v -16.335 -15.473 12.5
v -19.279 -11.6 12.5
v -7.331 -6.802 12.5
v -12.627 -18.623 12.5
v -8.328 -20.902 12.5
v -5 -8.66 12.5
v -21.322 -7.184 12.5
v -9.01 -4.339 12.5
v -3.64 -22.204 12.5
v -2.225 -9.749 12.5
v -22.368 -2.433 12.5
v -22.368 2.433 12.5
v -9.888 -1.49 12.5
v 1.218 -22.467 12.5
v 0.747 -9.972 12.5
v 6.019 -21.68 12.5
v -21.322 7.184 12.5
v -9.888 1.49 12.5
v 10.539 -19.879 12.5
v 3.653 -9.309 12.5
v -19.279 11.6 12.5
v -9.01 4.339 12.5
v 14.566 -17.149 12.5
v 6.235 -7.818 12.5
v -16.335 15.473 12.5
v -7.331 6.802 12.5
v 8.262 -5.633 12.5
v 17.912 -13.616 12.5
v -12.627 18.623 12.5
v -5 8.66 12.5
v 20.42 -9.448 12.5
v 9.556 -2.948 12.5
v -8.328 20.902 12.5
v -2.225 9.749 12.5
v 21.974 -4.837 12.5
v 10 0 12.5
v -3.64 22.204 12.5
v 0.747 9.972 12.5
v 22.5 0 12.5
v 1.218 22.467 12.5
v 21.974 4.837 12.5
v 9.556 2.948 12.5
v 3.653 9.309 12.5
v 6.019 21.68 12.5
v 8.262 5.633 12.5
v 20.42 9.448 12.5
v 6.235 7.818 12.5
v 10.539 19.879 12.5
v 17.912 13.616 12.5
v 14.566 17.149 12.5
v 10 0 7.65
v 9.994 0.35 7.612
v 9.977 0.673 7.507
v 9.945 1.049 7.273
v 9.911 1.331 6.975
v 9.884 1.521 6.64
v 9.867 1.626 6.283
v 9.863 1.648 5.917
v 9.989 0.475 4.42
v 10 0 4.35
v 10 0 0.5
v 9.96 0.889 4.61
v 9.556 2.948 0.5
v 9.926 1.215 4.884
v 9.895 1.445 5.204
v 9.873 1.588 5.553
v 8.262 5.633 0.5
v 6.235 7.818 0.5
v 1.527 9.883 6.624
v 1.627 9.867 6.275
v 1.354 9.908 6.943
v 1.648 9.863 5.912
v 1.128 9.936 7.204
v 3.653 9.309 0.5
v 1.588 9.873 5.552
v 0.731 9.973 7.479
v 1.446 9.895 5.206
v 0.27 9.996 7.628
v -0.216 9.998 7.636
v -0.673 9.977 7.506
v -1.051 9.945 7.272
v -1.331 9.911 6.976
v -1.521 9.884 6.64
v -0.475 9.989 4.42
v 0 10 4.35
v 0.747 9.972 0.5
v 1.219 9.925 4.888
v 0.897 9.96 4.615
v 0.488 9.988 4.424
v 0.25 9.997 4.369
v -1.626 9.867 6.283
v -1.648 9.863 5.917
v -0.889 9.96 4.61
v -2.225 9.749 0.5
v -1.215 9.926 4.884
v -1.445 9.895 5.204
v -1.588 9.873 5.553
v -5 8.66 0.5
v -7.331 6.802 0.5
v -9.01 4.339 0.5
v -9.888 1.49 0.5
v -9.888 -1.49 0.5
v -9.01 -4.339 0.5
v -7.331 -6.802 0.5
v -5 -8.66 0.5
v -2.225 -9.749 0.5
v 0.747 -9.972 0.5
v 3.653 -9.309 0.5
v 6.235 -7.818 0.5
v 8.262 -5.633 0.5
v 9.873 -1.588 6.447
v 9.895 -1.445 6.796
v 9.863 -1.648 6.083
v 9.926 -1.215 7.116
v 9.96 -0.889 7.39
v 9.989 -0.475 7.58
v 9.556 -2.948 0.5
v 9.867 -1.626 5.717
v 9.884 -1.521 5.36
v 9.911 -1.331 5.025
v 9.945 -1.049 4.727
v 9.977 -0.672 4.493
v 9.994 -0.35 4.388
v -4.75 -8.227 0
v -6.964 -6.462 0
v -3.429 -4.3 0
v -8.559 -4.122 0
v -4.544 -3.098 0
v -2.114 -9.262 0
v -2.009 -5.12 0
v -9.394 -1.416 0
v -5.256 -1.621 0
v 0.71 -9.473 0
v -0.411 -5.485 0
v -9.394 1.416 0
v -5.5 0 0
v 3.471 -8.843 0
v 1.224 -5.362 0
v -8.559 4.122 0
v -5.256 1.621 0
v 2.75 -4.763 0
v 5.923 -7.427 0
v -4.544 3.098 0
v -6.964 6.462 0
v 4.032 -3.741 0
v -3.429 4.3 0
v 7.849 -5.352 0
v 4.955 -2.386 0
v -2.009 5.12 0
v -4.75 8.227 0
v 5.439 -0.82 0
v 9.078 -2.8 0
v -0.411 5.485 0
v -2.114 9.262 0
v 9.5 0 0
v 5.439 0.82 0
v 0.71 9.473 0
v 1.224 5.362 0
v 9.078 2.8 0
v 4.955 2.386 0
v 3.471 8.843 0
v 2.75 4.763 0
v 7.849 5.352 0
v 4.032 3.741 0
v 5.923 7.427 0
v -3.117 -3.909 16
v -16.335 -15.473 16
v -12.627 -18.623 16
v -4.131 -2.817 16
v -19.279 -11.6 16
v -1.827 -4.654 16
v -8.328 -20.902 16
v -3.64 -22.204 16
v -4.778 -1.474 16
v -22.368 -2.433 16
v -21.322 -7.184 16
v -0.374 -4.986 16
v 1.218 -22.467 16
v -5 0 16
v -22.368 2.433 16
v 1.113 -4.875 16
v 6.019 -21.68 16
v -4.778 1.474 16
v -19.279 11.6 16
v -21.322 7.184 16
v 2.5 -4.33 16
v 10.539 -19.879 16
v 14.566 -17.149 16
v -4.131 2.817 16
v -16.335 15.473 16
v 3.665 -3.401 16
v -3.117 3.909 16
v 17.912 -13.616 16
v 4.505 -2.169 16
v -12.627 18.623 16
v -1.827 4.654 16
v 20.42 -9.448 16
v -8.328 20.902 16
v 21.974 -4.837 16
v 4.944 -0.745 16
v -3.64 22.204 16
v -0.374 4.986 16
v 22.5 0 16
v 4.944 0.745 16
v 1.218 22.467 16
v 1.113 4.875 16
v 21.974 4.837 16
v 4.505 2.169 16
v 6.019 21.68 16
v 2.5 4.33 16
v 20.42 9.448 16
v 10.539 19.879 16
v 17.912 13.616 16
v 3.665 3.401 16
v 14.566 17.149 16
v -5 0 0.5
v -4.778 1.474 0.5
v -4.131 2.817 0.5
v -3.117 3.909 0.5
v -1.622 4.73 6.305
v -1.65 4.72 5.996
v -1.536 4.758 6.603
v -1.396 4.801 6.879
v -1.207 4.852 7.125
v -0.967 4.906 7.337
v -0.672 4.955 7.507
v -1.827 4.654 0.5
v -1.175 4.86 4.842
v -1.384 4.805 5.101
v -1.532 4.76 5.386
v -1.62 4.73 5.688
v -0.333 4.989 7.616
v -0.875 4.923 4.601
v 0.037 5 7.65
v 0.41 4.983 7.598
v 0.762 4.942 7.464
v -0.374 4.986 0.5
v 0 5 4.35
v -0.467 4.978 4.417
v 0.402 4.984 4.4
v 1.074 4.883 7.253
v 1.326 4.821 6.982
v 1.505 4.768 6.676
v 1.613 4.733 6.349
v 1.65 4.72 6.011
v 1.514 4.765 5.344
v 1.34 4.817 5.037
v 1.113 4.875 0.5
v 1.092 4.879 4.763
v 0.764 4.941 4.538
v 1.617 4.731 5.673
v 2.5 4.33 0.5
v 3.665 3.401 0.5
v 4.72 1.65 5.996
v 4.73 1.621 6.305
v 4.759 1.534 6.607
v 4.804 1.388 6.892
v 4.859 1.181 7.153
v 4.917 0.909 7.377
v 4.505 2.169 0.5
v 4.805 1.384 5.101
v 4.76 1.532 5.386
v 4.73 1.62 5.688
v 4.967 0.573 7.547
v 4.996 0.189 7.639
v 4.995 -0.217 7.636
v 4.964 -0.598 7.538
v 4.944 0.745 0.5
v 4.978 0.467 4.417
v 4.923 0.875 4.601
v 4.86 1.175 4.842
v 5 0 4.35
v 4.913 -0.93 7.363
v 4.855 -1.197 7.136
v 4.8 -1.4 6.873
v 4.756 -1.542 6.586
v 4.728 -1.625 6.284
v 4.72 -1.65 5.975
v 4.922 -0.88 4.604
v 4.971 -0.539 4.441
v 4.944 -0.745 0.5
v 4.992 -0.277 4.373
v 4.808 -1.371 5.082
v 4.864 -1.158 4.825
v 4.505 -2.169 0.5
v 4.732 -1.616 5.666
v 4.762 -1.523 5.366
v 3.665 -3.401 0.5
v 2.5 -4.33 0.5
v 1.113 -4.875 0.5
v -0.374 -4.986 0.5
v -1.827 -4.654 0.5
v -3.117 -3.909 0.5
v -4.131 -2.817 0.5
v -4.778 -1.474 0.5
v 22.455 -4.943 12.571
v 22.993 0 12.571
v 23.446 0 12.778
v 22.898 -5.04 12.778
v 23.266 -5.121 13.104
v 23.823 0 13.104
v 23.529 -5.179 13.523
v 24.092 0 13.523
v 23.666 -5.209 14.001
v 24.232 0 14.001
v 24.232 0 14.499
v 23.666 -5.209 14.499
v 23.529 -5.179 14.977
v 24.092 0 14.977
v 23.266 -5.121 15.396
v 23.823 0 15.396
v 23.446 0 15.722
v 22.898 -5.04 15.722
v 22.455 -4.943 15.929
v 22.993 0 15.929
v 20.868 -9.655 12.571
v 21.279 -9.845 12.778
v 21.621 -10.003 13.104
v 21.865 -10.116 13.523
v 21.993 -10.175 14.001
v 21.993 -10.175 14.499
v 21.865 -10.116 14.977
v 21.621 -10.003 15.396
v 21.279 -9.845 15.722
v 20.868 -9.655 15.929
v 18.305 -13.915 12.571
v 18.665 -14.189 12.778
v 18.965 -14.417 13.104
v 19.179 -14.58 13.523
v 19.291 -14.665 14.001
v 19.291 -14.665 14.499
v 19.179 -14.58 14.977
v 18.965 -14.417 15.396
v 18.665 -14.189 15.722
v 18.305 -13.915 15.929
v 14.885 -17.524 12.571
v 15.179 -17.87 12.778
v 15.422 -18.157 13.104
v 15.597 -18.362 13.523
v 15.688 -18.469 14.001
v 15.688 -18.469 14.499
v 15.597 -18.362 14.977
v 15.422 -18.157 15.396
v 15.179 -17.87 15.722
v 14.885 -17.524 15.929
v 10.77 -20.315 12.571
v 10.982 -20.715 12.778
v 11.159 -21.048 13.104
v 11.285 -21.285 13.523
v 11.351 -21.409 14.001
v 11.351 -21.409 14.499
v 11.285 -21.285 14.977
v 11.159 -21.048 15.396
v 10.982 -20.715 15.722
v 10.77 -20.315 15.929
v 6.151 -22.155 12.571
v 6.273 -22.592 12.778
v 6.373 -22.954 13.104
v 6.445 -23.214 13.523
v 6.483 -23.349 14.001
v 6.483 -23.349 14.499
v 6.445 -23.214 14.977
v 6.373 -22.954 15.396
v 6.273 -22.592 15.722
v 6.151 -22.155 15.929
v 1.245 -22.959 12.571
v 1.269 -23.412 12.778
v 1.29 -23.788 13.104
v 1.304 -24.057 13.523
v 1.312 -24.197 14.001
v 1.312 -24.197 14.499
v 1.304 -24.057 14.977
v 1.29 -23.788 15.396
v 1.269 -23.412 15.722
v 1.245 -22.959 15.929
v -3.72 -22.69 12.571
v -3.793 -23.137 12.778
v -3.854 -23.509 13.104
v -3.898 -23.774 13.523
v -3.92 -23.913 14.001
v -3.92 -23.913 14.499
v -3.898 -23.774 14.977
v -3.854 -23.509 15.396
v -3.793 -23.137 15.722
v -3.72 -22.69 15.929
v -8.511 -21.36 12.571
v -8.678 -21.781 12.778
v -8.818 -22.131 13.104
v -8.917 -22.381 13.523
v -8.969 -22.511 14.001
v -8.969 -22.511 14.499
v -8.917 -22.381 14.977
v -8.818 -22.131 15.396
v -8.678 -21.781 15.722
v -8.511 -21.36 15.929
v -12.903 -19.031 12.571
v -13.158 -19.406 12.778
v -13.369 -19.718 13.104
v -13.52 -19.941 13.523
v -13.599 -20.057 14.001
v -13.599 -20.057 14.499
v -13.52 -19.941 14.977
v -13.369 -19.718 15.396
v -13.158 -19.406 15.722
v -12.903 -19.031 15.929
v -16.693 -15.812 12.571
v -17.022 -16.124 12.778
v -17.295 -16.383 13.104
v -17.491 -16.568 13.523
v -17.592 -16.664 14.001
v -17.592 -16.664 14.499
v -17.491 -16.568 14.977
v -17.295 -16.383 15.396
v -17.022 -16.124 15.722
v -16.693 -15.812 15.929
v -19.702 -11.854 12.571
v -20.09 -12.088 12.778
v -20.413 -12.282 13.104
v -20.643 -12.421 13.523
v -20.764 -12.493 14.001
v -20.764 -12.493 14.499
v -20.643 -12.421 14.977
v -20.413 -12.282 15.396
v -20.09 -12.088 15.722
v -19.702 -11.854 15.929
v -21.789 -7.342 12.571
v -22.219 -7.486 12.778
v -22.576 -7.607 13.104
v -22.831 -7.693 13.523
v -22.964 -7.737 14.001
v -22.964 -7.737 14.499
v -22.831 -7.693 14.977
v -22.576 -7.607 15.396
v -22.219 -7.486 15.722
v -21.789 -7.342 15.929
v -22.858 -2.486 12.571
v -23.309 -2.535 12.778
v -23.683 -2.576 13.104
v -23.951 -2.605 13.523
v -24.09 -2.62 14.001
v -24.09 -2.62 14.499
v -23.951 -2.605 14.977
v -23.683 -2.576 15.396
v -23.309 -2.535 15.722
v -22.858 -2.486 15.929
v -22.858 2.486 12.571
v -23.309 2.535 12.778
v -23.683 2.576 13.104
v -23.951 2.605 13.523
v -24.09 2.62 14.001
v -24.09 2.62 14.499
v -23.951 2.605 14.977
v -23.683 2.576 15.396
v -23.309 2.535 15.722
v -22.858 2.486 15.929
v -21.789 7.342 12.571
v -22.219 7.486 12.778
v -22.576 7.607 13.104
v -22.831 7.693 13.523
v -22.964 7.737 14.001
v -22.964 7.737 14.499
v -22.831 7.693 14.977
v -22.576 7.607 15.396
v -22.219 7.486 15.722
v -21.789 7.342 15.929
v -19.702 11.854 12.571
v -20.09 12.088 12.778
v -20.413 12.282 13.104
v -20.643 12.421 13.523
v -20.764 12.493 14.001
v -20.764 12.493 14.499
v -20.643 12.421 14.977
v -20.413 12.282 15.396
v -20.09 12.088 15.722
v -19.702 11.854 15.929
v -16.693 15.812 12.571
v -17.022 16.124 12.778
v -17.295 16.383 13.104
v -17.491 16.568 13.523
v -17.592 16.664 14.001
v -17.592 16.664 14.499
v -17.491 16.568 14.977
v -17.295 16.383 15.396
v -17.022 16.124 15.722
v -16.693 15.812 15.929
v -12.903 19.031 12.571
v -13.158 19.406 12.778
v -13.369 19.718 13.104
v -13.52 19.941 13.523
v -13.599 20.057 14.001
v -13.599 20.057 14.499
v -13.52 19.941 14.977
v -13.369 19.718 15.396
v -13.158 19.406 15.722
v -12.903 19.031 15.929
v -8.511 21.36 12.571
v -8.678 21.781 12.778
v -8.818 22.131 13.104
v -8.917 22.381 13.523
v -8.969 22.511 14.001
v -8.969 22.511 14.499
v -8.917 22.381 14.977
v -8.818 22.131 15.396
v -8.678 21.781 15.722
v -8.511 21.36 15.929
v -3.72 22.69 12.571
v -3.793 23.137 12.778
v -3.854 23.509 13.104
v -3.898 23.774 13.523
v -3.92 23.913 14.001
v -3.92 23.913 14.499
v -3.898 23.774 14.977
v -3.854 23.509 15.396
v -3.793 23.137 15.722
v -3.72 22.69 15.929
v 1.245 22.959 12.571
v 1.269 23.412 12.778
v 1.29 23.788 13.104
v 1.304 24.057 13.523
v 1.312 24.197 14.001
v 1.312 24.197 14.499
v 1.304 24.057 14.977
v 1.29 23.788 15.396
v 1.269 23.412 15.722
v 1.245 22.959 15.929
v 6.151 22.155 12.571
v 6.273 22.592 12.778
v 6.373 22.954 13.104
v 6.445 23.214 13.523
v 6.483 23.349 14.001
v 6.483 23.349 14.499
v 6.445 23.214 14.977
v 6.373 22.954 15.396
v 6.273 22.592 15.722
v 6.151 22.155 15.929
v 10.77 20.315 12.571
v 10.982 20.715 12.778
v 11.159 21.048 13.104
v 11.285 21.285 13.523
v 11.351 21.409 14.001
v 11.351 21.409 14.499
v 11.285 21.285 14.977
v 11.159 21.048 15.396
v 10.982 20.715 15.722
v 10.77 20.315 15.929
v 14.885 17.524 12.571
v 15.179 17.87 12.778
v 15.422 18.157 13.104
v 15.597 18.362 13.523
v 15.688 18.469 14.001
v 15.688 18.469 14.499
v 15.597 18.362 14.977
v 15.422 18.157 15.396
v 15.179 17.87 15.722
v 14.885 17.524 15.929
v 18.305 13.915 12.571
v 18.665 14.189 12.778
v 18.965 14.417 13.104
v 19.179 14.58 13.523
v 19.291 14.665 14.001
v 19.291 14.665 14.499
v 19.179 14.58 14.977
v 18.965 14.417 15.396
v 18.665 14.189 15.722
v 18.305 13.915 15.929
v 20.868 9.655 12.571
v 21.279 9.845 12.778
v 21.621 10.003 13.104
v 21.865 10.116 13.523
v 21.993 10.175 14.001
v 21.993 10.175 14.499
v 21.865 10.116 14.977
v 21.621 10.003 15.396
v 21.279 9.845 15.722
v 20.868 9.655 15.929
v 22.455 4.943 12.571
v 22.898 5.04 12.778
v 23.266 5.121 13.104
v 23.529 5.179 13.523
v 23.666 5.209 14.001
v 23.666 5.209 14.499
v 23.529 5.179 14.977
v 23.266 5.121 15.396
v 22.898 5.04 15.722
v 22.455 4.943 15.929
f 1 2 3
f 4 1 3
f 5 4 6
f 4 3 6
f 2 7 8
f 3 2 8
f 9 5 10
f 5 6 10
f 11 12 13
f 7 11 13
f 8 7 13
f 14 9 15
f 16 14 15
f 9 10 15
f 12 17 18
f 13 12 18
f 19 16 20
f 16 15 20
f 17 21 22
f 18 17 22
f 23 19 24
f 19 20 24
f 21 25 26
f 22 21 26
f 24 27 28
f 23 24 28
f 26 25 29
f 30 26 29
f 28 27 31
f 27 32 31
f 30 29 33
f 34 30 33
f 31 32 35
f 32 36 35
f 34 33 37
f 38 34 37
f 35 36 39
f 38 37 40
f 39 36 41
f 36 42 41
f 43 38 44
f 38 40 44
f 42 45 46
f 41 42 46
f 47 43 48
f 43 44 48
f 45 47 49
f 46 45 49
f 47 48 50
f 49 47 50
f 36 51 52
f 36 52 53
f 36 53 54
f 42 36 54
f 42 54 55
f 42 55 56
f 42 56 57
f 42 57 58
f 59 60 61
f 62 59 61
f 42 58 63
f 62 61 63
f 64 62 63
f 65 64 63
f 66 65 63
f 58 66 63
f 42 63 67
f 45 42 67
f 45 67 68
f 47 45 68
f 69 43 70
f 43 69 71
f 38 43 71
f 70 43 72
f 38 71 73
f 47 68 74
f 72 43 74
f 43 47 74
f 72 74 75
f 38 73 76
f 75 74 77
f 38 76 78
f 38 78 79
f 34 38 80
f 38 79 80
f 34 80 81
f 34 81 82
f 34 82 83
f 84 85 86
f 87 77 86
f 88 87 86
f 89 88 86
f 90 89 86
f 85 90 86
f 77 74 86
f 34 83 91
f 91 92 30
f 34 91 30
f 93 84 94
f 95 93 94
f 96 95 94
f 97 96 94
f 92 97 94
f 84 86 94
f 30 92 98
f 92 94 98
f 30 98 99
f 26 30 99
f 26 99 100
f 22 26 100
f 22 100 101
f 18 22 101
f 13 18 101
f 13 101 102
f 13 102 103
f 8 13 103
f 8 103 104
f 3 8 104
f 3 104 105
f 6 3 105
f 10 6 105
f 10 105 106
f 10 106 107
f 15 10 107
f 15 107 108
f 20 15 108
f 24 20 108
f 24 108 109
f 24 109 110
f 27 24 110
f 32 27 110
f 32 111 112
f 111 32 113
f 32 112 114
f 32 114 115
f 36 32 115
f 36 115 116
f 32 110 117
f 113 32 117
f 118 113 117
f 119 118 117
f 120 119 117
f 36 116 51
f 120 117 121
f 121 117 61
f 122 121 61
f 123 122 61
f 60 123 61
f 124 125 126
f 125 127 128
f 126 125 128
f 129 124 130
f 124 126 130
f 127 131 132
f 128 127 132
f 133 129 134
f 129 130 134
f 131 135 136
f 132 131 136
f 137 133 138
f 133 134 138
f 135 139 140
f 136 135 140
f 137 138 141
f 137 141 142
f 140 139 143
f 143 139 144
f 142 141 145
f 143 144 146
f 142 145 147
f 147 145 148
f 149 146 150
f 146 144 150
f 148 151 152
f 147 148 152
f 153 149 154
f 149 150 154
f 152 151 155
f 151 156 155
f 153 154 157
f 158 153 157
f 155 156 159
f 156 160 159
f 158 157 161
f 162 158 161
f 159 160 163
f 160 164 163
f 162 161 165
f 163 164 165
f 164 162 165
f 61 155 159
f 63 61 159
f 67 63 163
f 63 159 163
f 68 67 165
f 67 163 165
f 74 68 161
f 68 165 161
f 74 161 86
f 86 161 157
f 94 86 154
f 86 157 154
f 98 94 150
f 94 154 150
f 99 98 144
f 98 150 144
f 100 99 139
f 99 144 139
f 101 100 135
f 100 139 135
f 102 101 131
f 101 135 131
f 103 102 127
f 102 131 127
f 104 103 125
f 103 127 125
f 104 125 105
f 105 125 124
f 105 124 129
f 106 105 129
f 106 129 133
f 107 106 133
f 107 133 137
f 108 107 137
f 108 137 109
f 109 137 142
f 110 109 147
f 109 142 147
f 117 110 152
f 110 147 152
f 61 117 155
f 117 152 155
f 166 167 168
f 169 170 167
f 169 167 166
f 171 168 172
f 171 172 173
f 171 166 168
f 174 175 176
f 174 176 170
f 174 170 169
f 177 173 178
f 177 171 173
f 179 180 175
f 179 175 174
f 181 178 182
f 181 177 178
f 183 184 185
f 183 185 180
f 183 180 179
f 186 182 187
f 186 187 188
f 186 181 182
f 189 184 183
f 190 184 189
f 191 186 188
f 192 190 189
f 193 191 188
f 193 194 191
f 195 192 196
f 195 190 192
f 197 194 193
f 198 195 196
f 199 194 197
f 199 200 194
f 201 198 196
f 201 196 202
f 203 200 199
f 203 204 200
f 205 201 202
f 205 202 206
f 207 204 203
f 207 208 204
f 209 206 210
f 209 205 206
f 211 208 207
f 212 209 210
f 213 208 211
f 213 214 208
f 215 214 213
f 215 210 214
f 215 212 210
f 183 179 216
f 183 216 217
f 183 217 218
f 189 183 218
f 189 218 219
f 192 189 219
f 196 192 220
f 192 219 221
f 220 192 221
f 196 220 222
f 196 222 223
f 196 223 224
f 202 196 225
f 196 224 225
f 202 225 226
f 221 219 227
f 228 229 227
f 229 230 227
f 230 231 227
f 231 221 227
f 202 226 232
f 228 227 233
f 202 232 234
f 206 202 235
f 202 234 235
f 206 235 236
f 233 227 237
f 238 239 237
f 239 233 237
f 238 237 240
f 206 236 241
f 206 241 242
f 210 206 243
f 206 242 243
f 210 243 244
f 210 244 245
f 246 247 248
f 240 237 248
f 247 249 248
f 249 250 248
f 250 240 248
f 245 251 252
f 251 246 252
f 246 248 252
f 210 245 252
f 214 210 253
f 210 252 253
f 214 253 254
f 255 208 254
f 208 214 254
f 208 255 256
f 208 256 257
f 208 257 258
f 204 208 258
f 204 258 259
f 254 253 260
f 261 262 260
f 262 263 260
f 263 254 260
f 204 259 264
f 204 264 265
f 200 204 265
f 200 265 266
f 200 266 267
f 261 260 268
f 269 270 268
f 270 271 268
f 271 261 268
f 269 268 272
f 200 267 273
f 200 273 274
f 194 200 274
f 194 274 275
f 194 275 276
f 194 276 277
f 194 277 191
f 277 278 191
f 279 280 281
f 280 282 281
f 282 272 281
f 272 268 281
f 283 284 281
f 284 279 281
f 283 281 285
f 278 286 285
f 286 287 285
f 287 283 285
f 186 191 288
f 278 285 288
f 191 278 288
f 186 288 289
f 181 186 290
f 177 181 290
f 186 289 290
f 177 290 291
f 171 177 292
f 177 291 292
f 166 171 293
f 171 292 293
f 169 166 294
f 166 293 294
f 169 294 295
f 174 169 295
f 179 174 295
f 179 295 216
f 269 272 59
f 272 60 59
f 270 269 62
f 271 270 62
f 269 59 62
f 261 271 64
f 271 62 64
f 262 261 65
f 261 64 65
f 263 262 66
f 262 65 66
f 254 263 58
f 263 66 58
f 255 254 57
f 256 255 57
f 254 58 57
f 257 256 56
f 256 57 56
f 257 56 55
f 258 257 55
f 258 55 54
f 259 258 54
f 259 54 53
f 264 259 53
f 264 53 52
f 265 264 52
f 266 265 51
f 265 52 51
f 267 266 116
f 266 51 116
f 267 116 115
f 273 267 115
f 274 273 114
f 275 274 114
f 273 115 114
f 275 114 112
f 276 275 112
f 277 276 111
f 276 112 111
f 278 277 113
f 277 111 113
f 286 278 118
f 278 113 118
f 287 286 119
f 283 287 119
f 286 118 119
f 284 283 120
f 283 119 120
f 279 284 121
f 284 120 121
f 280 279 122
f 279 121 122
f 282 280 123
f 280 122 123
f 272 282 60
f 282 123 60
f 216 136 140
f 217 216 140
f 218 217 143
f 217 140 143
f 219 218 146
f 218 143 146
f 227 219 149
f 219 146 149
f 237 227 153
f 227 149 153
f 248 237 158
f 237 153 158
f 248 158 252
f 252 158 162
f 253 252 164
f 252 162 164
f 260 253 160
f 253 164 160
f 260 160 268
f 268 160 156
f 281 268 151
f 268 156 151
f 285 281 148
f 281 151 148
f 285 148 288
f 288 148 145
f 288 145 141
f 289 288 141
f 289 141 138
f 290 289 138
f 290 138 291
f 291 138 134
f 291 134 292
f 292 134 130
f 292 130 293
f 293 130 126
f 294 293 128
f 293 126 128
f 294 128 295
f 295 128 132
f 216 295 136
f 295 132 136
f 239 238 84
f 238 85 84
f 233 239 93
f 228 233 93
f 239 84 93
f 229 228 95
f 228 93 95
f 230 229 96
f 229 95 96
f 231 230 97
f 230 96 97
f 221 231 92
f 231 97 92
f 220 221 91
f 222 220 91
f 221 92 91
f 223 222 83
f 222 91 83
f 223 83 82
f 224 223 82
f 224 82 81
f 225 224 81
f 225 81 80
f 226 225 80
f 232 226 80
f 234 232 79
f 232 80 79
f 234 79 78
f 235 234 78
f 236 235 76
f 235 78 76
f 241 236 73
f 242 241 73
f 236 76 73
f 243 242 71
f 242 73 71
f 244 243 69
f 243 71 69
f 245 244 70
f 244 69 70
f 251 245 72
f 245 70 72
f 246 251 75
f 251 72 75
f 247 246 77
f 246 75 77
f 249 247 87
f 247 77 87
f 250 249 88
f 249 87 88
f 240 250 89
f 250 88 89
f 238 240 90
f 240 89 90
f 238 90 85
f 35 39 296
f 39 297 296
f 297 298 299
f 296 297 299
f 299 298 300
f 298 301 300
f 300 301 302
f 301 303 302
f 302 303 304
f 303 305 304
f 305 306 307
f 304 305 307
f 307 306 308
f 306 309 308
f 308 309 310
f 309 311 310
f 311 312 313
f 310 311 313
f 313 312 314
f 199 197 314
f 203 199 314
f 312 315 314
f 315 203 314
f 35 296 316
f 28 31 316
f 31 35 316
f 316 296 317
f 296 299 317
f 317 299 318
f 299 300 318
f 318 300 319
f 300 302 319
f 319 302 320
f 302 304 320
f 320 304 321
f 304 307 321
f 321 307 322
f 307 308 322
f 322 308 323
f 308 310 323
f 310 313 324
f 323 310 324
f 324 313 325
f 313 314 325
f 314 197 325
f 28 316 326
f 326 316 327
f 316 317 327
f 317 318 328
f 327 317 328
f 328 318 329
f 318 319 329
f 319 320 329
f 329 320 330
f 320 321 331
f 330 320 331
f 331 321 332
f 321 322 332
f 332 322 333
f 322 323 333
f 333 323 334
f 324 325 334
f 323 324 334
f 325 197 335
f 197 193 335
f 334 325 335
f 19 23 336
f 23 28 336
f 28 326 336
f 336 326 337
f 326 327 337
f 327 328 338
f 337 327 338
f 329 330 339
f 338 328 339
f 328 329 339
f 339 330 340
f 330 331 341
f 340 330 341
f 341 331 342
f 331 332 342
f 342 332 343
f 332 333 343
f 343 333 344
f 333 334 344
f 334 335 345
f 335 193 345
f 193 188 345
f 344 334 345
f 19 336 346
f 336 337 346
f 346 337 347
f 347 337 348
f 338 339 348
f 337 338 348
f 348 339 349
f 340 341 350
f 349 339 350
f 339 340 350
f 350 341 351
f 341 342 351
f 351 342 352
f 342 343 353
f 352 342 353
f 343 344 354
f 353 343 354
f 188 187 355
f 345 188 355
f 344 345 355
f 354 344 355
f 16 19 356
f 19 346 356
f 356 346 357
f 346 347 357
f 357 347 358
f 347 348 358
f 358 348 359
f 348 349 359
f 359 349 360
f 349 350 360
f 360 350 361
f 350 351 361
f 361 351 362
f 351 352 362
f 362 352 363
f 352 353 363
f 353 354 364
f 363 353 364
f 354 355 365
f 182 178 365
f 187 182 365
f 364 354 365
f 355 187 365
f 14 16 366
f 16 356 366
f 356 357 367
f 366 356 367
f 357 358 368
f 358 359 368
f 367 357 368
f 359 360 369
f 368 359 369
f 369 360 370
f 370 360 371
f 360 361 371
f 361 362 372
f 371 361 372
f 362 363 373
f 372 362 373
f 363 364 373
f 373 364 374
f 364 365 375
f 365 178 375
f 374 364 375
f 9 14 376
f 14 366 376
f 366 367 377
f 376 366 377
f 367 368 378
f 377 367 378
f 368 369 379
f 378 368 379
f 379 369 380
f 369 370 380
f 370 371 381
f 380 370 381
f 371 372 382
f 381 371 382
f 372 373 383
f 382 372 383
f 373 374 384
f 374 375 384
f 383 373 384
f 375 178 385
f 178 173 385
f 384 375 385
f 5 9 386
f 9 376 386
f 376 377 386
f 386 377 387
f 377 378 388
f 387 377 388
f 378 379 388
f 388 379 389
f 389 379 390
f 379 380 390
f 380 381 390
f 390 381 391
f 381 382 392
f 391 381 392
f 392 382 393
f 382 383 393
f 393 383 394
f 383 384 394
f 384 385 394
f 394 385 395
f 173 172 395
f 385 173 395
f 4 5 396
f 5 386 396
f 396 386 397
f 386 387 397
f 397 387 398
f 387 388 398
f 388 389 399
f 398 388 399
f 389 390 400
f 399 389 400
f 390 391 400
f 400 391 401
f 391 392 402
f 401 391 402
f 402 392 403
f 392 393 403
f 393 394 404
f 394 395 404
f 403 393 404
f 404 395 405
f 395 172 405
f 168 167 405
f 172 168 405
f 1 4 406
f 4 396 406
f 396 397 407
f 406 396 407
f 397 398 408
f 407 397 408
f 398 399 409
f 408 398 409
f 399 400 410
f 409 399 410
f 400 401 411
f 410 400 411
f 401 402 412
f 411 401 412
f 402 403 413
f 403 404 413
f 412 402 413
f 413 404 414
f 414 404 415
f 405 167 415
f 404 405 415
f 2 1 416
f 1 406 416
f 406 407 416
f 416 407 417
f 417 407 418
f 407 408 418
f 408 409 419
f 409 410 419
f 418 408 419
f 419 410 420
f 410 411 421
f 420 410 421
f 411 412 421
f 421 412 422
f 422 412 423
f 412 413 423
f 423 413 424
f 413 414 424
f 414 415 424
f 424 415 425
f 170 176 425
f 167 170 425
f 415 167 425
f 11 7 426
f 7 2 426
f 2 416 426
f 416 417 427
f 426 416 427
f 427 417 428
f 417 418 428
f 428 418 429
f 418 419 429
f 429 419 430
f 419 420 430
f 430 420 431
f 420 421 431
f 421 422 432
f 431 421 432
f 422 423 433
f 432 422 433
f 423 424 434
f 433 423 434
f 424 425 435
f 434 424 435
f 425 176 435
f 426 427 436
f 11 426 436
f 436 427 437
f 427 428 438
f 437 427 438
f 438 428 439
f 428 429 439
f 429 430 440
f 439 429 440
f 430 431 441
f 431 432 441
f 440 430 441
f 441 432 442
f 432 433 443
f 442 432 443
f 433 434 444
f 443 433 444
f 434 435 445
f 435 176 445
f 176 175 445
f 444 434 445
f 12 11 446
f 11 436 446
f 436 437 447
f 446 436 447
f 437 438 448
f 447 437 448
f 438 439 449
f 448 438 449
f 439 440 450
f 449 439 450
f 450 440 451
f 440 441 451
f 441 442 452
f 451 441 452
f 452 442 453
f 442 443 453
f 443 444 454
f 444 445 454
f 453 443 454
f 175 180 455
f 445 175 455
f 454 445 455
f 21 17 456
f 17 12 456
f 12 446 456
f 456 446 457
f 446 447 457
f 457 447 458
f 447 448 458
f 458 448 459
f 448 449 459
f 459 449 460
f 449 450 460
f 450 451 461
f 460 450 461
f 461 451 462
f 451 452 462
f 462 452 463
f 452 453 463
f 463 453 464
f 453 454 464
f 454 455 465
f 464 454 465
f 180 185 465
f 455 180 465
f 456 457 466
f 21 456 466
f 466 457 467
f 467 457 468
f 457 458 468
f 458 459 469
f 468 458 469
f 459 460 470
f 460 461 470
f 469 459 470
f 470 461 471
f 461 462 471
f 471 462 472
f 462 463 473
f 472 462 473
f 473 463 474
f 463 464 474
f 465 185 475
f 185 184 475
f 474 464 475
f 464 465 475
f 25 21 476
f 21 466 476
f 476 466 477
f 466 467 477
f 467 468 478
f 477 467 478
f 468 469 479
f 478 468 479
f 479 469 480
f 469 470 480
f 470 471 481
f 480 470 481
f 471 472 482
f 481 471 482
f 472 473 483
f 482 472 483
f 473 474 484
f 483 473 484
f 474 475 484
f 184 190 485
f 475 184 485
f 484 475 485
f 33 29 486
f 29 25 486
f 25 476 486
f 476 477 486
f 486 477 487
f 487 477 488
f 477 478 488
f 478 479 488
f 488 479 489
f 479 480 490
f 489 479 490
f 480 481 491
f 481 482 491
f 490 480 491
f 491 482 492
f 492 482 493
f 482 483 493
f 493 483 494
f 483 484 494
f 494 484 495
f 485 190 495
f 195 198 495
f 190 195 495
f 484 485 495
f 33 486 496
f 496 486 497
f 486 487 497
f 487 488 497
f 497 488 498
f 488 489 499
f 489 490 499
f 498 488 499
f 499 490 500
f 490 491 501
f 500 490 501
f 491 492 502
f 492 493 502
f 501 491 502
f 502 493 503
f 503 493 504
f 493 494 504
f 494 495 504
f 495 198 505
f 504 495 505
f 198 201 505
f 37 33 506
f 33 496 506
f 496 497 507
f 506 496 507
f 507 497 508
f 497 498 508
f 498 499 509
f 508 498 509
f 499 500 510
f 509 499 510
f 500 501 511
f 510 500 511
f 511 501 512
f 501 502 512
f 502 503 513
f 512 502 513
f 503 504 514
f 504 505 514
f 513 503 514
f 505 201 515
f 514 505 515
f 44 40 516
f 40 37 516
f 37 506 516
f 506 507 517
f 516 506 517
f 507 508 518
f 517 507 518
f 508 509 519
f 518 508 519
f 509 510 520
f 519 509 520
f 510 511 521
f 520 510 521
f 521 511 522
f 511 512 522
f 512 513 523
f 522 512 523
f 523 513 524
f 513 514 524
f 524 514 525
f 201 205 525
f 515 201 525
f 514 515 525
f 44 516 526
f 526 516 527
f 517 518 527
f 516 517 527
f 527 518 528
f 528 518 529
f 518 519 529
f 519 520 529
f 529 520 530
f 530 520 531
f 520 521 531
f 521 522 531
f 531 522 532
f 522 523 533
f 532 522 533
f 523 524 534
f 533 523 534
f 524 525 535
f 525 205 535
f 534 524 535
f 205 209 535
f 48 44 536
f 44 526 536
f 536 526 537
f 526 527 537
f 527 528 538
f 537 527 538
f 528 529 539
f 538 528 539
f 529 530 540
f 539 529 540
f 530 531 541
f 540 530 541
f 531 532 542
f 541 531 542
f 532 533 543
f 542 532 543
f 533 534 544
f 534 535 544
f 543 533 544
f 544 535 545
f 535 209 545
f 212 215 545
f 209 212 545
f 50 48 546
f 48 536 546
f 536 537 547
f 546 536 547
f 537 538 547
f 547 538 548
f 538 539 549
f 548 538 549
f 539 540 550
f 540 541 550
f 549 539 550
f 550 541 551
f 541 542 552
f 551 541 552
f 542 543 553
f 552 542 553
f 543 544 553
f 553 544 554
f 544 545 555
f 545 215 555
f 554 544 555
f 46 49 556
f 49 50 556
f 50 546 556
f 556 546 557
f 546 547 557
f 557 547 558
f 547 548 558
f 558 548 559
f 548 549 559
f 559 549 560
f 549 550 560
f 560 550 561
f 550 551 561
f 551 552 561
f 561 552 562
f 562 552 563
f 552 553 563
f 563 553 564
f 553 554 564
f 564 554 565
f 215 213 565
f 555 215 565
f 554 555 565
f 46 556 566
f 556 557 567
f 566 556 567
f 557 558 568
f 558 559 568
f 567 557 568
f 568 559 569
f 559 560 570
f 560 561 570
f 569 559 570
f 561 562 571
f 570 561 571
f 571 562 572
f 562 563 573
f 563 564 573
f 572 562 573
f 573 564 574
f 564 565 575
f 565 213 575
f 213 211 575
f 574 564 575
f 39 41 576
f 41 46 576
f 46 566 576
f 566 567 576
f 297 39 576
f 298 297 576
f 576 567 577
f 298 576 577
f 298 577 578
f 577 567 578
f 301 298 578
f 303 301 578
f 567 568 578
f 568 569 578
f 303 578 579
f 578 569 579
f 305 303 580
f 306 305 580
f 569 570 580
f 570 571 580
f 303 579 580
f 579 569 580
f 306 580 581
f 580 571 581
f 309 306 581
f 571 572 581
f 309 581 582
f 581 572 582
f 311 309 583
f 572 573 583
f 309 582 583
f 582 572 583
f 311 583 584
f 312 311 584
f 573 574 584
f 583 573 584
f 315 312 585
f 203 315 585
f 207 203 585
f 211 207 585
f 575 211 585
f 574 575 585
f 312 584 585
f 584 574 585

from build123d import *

# Parameters (mm, degrees)
SKETCH_1_R               = 10
EXTRUDE_1_DEPTH          = 12.5
SKETCH_2_R               = 22.5
EXTRUDE_2_DEPTH          = 3.5
SKETCH_4_R               = 5
CUT_EXTRUDE_3_DEPTH      = 36.616007637
SKETCH_5_W               = 1.65
SKETCH_5_H               = 24.25
CHAMFER_2_SIZE           = 0.5
SKETCH_3_R               = 1.75
PATTERN_CIRCULAR_1_COUNT = 2
PATTERN_CIRCULAR_1_ANGLE = 90


with BuildPart() as part:
    # 草图1 → 拉伸1 (new body)
    with BuildSketch(Plane.XY):
        Circle(SKETCH_1_R)
    extrude(amount=EXTRUDE_1_DEPTH)

    # 草图2 → 拉伸2 (add)
    with BuildSketch(Plane.XY.offset(12.5)):
        Circle(SKETCH_2_R)
    extrude(amount=EXTRUDE_2_DEPTH)

    # 草图4 → 拉伸3 (cut, through all)
    with BuildSketch(Plane(origin=(0, 0, 0), x_dir=(-1, 0, 0), z_dir=(0, 0, -1))):
        Circle(SKETCH_4_R)
    extrude(amount=-CUT_EXTRUDE_3_DEPTH, mode=Mode.SUBTRACT)

    # 草图5 → M4 螺纹孔1 (revolve, cut)
    with BuildSketch(Plane(origin=(0, 0, 6), x_dir=(0, 0, -1), z_dir=(1, 0, 0))):
        with Locations((0.825, 12.125)):
            Rectangle(SKETCH_5_W, SKETCH_5_H)
    hole_wizard_m4_1 = revolve(axis=Axis((0, -6.35, 6), (0, 1, 0)), mode=Mode.SUBTRACT)

    # 倒角2
    chamfer_2_edges = [part.edges().sort_by_distance(p)[0] for p in [
        (5, 0, 0),
        (-10, 0, 0),
    ]]
    chamfer(chamfer_2_edges, length=CHAMFER_2_SIZE)

    # 草图3 → 旋转1 (revolve)
    with BuildSketch(Plane(origin=(0, 0, 0), x_dir=(1, 0, 0), z_dir=(0, 1, 0)), mode=Mode.PRIVATE) as revolve_1_sk:
        with Locations((-22.5, -14.25)):
            Circle(SKETCH_3_R)
    revolve(revolve_1_sk.sketch.rotate(Axis((0, 0, 12.5), (0, 0, -1)), 180), axis=Axis((0, 0, 12.5), (0, 0, -1)))

    # 阵列(圆周)1: M4 螺纹孔1 ×2 about axis
    pattern_circular_1_axis = Axis((0, 0, 12.5), (0, 0, -1))
    for i in range(1, PATTERN_CIRCULAR_1_COUNT):
        add(hole_wizard_m4_1.rotate(pattern_circular_1_axis, i * PATTERN_CIRCULAR_1_ANGLE / (PATTERN_CIRCULAR_1_COUNT - 1)), mode=Mode.SUBTRACT)


solid = part.part
